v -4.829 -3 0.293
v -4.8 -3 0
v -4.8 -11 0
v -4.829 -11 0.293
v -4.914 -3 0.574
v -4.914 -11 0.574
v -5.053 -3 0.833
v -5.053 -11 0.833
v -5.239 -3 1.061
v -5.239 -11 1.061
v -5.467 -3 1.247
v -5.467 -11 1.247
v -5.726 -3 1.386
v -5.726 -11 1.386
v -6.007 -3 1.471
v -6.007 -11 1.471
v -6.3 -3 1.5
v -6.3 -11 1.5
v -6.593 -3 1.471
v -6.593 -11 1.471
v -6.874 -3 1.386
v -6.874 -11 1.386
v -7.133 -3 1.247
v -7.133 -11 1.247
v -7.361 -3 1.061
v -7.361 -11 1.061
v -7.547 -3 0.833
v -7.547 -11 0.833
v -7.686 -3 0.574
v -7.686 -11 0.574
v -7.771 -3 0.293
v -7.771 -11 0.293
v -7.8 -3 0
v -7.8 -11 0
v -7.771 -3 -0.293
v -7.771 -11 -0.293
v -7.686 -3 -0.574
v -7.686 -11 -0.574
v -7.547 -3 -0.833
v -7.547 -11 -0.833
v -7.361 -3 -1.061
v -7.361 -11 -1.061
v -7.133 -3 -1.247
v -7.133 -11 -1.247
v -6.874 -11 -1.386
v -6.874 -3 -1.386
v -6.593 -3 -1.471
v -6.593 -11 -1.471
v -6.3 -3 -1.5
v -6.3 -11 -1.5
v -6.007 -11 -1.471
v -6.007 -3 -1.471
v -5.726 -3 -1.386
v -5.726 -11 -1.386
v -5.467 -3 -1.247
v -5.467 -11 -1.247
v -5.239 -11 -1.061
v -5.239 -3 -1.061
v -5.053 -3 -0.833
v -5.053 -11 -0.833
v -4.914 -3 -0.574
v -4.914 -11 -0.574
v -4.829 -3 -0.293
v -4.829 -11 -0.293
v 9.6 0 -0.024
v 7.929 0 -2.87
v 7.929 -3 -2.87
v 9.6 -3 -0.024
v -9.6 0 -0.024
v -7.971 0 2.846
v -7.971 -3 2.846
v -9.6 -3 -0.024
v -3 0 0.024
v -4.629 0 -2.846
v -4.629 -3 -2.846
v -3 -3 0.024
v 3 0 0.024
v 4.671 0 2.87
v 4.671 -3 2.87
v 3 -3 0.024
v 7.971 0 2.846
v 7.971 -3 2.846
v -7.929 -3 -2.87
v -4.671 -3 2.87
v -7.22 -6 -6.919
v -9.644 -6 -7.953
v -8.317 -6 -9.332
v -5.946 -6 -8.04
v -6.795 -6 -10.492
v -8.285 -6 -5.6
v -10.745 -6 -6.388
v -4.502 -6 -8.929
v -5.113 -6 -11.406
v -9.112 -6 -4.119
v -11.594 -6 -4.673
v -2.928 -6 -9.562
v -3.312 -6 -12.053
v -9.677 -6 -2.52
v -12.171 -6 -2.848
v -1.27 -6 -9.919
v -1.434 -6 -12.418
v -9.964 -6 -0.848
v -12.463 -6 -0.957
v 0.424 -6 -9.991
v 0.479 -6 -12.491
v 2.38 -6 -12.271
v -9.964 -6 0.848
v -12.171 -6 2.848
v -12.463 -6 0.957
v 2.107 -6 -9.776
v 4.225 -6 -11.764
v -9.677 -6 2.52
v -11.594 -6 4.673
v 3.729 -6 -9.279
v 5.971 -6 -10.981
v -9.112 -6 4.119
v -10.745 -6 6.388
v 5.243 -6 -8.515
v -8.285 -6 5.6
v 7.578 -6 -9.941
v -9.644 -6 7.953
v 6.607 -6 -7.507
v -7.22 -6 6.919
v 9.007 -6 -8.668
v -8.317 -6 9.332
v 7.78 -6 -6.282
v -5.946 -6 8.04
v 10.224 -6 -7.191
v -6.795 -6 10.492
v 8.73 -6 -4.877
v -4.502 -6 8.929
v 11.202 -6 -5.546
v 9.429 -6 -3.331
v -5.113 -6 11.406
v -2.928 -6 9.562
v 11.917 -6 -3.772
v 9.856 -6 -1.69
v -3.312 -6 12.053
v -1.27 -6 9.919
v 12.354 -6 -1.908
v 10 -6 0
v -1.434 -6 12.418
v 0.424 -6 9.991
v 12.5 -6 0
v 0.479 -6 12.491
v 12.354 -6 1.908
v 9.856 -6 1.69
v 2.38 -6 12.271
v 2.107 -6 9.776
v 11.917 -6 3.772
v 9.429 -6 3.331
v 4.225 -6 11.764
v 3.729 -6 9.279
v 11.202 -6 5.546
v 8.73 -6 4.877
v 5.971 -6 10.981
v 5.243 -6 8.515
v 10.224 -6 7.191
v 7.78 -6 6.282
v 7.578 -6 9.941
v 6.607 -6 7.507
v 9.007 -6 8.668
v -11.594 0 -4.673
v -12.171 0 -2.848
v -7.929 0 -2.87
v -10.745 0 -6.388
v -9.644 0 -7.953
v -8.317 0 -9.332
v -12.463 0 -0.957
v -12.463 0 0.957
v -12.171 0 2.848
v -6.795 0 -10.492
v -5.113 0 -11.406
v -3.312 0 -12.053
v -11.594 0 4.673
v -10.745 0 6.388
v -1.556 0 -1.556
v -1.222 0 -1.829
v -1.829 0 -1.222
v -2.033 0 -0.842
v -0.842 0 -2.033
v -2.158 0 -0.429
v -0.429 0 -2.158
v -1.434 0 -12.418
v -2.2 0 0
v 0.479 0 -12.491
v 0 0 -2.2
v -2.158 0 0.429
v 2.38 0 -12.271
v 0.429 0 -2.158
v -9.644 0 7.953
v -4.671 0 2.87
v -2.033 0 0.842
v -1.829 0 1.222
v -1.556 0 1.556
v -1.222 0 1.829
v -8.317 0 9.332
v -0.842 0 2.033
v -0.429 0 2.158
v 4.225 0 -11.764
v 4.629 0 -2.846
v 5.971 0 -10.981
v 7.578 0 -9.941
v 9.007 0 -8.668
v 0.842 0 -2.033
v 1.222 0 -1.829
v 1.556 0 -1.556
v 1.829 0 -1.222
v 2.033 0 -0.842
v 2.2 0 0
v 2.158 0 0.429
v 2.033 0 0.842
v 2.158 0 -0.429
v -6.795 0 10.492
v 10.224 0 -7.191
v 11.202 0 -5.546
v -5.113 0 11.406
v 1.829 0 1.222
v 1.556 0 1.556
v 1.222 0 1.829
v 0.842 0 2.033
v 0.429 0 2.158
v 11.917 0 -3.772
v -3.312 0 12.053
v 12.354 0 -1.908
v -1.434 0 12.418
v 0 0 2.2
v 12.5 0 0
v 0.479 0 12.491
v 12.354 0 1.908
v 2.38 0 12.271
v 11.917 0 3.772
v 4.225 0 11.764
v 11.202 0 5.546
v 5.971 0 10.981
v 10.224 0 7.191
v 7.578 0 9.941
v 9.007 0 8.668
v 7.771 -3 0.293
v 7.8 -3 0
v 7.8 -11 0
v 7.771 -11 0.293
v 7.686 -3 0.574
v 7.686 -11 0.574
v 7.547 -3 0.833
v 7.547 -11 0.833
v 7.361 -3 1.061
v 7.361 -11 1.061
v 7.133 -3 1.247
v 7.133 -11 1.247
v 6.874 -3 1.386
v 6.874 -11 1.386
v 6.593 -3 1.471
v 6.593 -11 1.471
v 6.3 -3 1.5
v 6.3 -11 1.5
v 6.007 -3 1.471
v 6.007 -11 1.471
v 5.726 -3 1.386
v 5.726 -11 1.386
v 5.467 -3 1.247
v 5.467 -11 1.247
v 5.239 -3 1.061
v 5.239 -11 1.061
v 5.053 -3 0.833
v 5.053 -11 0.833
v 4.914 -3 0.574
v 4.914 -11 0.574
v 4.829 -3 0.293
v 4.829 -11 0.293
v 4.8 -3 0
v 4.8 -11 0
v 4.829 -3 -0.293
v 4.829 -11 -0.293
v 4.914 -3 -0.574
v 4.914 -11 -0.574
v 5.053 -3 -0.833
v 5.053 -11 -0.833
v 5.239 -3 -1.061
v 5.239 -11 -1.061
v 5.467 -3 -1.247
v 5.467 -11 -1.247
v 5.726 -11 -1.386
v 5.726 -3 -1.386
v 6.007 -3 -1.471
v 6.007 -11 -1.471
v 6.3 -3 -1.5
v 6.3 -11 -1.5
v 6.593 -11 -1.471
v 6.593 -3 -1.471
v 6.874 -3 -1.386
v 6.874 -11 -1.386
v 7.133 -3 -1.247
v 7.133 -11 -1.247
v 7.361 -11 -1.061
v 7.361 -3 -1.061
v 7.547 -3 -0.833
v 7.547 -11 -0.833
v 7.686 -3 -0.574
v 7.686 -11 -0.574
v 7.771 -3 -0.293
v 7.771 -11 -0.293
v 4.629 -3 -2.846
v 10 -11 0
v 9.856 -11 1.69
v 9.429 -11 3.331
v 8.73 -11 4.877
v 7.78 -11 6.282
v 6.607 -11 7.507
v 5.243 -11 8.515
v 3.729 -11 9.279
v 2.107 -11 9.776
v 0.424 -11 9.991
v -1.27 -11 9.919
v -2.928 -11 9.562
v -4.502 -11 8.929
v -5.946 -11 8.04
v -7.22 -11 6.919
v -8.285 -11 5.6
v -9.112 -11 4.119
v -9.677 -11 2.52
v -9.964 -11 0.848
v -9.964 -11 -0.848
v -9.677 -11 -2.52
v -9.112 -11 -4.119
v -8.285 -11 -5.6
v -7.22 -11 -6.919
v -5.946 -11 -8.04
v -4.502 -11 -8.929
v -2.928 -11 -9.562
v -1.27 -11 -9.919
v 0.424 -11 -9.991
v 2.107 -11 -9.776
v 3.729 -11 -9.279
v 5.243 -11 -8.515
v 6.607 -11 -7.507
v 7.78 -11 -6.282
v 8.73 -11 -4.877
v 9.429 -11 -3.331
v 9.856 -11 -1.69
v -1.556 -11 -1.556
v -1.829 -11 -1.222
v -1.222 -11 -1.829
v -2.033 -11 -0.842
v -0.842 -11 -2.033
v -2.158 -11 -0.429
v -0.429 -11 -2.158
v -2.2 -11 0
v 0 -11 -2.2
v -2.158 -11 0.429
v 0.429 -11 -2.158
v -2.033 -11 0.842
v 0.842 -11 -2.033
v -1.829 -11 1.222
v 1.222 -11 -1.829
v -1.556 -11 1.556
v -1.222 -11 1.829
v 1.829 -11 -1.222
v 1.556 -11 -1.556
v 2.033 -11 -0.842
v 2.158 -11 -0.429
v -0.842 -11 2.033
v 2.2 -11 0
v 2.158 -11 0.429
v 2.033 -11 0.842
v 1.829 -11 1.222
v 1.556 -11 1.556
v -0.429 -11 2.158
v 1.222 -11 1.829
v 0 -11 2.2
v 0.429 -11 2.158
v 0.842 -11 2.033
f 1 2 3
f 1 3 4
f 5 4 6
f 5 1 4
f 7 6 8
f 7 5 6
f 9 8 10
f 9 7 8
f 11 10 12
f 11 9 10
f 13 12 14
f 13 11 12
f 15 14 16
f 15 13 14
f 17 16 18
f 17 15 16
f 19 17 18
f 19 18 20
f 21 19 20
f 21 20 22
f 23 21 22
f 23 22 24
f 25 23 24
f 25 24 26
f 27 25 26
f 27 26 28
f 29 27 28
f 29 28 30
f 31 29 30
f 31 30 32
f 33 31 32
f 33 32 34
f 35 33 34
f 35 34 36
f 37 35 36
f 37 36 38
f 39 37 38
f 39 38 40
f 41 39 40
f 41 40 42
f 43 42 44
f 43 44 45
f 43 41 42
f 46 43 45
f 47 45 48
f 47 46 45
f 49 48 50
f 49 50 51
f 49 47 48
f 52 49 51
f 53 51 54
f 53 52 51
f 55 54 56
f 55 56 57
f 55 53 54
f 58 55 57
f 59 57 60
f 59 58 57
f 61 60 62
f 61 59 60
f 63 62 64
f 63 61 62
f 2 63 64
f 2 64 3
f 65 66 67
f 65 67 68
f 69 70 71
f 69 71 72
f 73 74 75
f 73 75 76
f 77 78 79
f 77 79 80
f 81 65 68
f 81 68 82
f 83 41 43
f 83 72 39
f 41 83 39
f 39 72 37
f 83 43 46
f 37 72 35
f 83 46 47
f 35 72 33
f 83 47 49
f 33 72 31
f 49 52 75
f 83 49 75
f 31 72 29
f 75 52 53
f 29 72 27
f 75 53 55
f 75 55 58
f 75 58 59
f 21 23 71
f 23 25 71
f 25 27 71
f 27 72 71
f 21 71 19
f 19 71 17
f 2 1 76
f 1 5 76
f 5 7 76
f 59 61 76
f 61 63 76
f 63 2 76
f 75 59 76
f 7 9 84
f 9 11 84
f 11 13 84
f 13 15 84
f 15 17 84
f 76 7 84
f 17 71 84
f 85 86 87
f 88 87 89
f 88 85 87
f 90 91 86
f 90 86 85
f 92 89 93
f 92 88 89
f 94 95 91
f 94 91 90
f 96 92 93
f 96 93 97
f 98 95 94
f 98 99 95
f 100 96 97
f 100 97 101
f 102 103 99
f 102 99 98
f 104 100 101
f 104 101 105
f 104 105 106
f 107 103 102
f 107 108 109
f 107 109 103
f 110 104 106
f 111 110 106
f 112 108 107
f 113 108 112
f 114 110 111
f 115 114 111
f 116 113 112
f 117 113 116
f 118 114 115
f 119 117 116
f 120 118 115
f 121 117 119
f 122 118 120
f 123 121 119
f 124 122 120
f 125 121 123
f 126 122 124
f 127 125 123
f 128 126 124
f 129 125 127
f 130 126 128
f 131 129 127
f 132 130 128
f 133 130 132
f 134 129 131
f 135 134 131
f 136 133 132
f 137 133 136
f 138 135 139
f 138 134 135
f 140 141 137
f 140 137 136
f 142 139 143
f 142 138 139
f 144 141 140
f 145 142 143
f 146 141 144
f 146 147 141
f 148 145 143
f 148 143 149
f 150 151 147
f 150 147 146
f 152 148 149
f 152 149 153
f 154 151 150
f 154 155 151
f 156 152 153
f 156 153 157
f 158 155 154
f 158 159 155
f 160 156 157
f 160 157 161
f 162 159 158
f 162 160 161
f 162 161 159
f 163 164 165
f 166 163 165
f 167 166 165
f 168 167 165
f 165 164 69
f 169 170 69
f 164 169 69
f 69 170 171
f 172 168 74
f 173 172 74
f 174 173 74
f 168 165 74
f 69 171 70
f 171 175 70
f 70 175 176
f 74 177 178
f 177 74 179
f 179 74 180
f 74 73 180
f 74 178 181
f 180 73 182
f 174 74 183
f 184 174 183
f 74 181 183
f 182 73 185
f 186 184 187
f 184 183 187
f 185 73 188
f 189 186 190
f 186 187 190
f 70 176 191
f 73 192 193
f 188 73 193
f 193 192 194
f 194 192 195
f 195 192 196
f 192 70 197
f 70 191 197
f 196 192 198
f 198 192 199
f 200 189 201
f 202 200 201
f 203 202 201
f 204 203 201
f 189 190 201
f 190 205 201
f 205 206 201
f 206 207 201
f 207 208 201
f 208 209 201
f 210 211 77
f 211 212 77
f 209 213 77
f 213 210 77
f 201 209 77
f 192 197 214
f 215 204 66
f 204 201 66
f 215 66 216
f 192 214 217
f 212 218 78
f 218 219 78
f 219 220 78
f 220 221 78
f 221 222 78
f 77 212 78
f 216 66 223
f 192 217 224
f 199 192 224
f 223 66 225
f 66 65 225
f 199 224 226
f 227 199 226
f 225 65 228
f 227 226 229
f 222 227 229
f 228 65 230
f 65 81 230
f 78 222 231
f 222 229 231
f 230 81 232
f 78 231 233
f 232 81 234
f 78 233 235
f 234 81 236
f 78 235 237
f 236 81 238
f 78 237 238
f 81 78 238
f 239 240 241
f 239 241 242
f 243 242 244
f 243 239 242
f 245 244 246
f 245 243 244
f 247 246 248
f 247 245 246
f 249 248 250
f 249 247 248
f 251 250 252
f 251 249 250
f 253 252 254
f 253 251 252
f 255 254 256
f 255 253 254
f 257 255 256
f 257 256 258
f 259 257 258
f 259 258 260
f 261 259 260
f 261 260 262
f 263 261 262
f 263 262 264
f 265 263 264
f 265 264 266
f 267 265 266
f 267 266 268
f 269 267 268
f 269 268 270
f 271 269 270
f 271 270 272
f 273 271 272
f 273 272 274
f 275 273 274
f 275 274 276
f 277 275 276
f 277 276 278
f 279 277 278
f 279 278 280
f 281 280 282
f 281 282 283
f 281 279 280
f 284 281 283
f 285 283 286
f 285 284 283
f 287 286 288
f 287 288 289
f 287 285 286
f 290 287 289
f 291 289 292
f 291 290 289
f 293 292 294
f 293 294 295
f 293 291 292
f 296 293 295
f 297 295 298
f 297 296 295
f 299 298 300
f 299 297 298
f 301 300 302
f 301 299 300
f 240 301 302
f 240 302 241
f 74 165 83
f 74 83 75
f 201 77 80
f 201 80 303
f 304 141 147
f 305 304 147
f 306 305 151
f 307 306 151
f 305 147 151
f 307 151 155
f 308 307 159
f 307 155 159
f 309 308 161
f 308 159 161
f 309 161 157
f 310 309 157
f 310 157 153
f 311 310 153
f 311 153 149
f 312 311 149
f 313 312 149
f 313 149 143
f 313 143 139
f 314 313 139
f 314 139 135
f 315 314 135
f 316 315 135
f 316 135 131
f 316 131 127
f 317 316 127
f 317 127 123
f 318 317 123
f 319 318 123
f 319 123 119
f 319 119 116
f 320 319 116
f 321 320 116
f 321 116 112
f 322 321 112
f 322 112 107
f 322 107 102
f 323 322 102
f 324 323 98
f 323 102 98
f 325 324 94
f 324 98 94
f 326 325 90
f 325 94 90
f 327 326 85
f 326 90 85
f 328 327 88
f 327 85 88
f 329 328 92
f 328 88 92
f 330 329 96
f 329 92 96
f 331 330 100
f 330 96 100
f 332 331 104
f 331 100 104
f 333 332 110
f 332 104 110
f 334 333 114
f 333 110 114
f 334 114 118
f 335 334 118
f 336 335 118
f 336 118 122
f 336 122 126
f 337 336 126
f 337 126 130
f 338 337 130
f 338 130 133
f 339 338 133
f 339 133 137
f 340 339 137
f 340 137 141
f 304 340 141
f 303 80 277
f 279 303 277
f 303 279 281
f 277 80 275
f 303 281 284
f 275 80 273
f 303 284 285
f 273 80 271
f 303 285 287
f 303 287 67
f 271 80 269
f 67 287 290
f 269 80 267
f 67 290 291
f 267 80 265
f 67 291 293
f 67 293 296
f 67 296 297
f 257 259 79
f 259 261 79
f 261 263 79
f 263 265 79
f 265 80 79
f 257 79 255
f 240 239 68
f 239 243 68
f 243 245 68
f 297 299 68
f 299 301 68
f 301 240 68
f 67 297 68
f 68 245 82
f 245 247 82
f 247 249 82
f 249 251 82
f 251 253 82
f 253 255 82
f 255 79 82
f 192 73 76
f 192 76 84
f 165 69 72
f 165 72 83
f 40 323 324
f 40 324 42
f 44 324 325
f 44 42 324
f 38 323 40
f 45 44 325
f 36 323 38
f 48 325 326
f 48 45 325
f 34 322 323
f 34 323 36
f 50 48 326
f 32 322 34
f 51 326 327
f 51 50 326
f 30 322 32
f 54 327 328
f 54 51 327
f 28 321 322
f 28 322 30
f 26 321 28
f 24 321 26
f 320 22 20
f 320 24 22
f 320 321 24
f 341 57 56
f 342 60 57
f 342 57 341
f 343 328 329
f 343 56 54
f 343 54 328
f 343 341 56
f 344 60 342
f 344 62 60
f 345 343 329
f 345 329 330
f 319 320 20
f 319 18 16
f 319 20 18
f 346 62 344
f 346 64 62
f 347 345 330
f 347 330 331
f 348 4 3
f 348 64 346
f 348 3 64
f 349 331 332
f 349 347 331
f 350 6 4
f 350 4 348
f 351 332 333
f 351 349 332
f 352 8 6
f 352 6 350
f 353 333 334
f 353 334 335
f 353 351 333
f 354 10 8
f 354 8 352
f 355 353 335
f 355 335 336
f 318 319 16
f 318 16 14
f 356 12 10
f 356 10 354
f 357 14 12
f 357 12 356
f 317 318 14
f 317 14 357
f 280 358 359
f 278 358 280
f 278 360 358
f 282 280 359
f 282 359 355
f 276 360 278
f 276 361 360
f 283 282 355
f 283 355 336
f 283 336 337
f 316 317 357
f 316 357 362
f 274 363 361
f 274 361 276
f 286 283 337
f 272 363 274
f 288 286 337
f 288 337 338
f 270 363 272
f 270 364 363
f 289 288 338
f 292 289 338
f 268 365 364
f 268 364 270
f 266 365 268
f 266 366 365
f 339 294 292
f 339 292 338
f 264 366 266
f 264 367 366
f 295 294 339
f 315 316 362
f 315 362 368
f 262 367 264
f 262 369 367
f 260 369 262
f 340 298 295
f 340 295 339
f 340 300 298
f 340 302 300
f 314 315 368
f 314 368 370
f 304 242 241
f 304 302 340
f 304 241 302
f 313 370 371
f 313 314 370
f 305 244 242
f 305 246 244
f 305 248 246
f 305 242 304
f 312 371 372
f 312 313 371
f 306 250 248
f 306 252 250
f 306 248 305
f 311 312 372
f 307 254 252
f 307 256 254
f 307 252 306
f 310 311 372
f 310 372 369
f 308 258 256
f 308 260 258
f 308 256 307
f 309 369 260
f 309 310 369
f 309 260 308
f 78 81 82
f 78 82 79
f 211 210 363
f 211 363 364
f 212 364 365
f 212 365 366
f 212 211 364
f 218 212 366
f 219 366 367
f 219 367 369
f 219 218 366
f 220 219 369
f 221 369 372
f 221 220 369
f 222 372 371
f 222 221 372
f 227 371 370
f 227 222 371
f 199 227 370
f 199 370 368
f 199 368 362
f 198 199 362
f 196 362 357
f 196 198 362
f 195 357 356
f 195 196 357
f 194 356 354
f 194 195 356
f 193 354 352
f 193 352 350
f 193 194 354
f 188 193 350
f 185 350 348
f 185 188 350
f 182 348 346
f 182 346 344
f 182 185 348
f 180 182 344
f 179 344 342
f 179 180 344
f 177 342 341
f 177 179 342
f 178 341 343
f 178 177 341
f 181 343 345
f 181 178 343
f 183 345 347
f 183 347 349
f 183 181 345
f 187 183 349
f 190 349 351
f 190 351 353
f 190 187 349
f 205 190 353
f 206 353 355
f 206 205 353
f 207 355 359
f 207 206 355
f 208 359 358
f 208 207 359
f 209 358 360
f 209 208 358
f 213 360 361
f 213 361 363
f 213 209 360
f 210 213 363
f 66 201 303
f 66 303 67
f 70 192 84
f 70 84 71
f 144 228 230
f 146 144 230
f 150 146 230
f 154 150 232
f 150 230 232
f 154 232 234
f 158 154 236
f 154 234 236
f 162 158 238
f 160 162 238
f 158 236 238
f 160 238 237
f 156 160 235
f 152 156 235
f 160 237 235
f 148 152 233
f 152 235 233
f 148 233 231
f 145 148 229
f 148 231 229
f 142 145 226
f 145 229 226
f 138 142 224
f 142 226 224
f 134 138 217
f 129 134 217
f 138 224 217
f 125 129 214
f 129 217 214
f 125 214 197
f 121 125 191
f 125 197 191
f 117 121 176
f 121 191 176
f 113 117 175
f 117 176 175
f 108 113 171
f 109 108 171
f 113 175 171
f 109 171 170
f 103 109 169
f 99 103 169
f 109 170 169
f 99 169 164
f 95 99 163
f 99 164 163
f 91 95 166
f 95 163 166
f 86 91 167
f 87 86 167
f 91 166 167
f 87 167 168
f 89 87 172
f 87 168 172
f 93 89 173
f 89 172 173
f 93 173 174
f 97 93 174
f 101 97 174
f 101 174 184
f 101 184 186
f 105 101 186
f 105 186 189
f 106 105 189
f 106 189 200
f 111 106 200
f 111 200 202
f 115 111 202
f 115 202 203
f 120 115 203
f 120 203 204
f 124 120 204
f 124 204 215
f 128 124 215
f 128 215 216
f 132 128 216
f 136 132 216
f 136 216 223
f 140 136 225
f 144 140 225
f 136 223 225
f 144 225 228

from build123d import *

# Parameters (mm, degrees)
F0_R     = 12.5
F0_R_2   = 10
F1_DEPTH = 6
F0_R_3   = 2.2
F2_DEPTH = 11
F3_R     = 1.5
F4_DEPTH = 11
F5_DEPTH = 3


with BuildPart() as f1:
    # F0 (on Front) → F1 (new body)
    with BuildSketch(Plane.XZ):
        Circle(F0_R)
        Circle(F0_R_2, mode=Mode.SUBTRACT)
    extrude(amount=F1_DEPTH)

    # F0 (on Front) → F2 (join)
    with BuildSketch(Plane.XZ):
        Circle(F0_R_2)
        Circle(F0_R_3, mode=Mode.SUBTRACT)
    extrude(amount=F2_DEPTH)

    # F3 (on Front) → F4 (cut)
    with BuildSketch(Plane.XZ):
        with Locations((6.3, 0)):
            Circle(F3_R)
        with Locations((-6.3, 0)):
            Circle(F3_R)
    extrude(amount=F4_DEPTH, mode=Mode.SUBTRACT)

    # F3 (on Front) → F5 (cut)
    with BuildSketch(Plane.XZ):
        Polygon((7.970619, 2.845979), (4.670619, 2.869788), (3, 0.023809), (4.629381, -2.845979), (7.929381, -2.869788), (9.6, -0.023809), align=None)
        with Locations((6.3, 0)):
            Circle(F3_R, mode=Mode.SUBTRACT)
        Polygon((-9.6, -0.023809), (-7.929381, -2.869788), (-4.629381, -2.845979), (-3, 0.023809), (-4.670619, 2.869788), (-7.970619, 2.845979), align=None)
        with Locations((-6.3, 0)):
            Circle(F3_R, mode=Mode.SUBTRACT)
    extrude(amount=F5_DEPTH, mode=Mode.SUBTRACT)


solid = f1.part
